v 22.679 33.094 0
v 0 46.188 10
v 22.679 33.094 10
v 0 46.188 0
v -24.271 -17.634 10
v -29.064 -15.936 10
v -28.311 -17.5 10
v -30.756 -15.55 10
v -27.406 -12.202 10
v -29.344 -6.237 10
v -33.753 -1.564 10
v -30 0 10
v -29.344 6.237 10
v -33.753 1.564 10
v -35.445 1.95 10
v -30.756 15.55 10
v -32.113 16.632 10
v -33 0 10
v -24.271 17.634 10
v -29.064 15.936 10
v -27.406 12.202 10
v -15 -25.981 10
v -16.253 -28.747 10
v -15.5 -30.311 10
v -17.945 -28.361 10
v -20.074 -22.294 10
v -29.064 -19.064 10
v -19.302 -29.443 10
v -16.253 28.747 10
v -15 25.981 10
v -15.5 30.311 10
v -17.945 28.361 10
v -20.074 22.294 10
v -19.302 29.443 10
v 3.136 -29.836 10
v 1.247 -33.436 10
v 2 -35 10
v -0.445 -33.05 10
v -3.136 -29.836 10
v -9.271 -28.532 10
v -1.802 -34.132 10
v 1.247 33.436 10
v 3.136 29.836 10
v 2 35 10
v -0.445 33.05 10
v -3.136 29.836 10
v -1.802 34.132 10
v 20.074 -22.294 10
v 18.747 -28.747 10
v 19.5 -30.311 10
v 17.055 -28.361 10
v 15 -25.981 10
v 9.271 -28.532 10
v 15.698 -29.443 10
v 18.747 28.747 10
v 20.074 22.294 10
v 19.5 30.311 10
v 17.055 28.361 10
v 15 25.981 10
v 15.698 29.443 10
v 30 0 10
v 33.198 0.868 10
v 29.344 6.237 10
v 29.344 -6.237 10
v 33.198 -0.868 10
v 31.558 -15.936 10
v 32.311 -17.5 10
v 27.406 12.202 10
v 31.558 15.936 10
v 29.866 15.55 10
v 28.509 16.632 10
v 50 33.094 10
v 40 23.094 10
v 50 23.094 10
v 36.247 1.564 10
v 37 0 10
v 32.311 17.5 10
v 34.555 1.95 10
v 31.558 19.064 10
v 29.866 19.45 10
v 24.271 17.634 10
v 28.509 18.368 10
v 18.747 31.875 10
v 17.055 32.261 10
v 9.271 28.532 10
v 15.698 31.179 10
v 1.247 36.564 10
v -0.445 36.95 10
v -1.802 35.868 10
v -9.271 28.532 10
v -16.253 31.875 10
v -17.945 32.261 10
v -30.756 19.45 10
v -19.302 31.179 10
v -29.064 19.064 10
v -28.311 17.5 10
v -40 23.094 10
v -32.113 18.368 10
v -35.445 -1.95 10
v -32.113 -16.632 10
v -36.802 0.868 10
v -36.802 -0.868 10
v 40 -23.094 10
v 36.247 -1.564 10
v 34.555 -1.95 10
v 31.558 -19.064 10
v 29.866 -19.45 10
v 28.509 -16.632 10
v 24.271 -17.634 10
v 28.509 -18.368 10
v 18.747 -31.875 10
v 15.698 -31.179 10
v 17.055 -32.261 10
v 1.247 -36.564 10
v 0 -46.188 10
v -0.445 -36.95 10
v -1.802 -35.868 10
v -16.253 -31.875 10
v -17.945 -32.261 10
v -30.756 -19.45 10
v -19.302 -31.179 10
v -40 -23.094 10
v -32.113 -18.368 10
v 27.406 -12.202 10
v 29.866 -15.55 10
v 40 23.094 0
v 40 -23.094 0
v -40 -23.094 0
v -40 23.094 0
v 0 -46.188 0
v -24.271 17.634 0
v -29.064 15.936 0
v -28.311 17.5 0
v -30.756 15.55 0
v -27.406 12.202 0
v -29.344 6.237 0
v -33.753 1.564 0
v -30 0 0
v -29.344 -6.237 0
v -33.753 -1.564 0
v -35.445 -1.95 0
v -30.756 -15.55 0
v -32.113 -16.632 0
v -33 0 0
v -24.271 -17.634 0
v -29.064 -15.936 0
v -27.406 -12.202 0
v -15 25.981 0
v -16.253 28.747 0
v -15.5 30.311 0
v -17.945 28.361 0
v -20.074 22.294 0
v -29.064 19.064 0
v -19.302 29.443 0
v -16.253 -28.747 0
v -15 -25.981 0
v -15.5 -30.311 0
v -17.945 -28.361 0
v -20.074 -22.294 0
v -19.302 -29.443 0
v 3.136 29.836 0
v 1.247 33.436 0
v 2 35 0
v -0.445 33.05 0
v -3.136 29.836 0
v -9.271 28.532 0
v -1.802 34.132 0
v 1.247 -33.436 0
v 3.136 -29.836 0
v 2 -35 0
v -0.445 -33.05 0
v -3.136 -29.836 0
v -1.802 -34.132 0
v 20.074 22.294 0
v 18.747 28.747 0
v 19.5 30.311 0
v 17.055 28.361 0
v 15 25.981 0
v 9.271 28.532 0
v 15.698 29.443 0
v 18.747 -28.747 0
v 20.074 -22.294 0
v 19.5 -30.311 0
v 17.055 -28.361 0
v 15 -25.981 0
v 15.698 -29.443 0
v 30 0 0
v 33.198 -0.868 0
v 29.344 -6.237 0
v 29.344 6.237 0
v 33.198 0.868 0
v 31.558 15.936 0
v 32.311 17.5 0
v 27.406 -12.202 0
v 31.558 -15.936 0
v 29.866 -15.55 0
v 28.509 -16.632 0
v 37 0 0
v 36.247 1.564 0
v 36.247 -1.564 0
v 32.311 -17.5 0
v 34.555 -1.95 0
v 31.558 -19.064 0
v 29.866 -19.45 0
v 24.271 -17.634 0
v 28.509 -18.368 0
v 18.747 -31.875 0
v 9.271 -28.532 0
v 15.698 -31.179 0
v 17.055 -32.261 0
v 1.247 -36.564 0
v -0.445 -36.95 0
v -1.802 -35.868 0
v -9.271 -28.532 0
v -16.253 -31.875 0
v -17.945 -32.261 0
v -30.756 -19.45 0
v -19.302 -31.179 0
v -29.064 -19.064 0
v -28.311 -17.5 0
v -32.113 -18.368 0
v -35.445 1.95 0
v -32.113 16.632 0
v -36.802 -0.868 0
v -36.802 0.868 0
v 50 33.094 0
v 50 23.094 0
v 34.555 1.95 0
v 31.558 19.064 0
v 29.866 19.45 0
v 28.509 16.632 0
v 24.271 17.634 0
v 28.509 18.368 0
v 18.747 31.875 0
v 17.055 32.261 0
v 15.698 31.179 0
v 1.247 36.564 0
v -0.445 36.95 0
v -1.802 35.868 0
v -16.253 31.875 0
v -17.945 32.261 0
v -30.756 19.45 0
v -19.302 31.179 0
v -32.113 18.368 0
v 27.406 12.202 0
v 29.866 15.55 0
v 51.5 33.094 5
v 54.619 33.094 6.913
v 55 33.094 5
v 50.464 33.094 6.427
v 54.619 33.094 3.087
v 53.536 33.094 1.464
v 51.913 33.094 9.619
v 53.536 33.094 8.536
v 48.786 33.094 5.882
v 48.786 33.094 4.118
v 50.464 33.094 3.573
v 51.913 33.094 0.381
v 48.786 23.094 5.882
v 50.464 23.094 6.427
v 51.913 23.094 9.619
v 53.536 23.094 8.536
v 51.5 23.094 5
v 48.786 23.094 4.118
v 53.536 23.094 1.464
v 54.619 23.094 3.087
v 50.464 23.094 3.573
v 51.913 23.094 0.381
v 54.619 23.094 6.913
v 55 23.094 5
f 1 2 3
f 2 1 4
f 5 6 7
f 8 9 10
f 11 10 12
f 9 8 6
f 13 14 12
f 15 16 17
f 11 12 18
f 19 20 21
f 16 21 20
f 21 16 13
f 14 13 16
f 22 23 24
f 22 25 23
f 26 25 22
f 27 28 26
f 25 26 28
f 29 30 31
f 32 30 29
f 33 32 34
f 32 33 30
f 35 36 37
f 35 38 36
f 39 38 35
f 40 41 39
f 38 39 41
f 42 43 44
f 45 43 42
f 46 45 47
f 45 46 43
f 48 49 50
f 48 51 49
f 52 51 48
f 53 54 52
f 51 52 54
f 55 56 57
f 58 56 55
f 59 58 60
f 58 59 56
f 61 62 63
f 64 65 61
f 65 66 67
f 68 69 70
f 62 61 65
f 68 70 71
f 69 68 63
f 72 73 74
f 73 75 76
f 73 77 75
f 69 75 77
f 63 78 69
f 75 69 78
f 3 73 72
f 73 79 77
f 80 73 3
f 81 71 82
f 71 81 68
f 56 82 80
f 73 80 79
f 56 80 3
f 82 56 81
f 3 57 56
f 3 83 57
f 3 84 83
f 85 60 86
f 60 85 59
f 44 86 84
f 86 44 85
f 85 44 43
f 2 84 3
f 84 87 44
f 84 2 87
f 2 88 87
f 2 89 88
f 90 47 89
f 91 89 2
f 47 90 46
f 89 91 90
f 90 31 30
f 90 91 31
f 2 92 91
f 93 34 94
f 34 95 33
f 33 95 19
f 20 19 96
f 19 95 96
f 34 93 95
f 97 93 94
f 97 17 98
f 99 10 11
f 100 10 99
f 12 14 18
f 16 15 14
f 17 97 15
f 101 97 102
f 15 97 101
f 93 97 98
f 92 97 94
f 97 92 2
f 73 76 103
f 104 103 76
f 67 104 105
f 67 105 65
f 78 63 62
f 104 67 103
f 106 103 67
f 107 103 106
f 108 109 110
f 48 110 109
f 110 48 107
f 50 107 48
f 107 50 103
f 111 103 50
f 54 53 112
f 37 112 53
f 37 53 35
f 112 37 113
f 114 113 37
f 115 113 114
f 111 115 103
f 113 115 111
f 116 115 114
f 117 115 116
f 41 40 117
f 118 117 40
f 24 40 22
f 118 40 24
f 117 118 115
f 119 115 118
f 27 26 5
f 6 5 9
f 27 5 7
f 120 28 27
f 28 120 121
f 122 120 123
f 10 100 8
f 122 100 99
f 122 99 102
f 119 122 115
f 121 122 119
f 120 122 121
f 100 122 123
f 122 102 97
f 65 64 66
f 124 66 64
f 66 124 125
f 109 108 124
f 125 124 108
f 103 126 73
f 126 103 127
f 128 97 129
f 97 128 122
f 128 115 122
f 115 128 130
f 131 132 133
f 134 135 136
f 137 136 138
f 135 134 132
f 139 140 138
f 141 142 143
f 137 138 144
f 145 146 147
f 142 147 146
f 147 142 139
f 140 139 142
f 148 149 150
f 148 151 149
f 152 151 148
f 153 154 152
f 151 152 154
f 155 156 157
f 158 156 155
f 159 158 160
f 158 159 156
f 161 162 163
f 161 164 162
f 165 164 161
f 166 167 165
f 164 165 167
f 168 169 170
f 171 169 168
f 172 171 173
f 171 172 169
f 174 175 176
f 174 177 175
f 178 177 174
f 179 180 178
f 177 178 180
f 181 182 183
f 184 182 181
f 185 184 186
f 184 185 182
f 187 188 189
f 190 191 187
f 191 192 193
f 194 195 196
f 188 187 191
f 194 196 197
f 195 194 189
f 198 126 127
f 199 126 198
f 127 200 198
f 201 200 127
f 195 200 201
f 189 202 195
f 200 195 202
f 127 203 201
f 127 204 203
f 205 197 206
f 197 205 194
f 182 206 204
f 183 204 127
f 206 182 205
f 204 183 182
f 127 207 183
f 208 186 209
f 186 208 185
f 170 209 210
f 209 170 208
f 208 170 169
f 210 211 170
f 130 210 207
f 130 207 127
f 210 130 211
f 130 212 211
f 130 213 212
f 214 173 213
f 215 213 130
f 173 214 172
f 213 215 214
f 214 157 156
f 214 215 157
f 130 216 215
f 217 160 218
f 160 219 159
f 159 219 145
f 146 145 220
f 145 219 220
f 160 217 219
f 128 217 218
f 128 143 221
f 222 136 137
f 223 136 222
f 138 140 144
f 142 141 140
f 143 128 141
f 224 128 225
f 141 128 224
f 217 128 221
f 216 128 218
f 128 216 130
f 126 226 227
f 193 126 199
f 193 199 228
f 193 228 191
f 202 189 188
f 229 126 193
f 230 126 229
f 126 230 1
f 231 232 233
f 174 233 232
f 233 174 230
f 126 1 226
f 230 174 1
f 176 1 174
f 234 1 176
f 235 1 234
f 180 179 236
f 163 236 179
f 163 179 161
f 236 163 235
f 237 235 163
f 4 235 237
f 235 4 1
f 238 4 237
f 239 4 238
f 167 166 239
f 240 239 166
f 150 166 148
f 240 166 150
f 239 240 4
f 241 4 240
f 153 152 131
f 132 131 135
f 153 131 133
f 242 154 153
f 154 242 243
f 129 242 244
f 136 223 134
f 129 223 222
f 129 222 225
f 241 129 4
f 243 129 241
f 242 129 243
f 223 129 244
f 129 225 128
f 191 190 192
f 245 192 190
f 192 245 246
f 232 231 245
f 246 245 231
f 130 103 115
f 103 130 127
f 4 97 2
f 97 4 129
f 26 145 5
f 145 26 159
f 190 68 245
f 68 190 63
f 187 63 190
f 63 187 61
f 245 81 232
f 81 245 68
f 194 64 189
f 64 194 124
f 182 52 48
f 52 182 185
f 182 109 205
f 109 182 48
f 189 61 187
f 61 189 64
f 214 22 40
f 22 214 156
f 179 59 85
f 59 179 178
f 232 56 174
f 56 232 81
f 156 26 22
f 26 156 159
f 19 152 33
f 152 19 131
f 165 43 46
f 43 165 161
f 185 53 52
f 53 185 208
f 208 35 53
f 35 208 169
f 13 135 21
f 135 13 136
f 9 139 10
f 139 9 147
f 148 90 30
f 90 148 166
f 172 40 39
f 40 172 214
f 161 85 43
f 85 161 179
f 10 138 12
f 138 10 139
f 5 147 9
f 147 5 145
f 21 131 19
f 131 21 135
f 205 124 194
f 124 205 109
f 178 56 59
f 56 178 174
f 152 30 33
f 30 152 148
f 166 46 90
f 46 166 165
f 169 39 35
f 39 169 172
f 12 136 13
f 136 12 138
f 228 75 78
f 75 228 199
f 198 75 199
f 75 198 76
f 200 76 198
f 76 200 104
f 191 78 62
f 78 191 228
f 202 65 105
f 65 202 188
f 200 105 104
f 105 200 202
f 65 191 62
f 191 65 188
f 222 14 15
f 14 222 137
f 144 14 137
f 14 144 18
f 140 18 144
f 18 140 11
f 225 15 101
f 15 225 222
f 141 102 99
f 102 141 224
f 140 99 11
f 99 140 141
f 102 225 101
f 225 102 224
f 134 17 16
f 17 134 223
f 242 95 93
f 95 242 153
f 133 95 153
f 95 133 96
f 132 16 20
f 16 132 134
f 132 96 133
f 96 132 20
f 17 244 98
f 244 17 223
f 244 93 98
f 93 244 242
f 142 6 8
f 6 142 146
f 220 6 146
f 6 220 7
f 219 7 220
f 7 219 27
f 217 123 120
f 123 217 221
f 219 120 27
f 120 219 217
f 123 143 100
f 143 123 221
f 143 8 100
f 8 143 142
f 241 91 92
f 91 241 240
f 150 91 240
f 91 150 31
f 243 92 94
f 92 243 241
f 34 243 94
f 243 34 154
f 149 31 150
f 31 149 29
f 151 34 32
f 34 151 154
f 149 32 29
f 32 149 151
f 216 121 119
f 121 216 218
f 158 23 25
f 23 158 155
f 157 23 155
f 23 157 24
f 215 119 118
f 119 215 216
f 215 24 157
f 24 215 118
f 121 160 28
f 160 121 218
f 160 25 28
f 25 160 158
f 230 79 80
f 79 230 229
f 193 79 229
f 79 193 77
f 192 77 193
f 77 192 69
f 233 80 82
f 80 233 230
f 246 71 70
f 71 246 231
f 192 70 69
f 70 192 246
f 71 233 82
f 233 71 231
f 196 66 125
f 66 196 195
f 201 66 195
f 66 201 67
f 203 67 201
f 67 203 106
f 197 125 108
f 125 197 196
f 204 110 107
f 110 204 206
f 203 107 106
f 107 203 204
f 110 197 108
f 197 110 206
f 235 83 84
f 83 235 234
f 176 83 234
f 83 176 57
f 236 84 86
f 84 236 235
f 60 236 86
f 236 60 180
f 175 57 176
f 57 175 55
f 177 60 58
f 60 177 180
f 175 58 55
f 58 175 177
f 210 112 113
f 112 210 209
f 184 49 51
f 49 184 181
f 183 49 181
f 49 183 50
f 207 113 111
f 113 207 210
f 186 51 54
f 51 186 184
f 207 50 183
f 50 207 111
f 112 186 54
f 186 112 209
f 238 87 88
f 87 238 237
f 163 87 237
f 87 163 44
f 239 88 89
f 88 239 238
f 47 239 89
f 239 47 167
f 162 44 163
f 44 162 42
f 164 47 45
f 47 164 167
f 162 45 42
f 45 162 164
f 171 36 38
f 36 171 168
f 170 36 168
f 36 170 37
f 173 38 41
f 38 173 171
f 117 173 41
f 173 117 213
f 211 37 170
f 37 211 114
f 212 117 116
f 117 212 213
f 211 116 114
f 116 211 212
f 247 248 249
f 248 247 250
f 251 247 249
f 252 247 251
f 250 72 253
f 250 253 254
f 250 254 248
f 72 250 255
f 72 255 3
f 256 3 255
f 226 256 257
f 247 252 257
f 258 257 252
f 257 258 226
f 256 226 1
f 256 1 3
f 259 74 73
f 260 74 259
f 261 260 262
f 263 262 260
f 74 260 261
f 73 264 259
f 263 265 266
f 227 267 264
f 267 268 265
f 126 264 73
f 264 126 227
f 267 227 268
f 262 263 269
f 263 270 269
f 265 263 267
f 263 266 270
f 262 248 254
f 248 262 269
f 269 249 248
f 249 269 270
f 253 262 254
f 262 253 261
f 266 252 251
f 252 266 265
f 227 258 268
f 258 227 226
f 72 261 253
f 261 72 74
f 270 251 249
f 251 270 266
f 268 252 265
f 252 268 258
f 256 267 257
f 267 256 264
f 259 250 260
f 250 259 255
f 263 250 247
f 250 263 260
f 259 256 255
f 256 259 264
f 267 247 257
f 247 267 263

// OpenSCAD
H = 10;

R = 30;

thikness = 10;

base = R + thikness;

l = base*sqrt(3)/3;
L = sqrt(l*l + base*base);


r = 2;
r_base = R + thikness/2;
r_l = r_base/2;
r_L = sqrt(r_base*r_base - r_l*r_l);

r_bolt = 1.5;

difference() {
	
	// 6-angle 
	linear_extrude(height = H) {
		polygon(points=[ [base, -l], [base, l], [0, L], [-base, l], [-base, -l], [0, -L] ]);
	
	}
	{
		// Hole in center
		cylinder(h = H, r = R);

		translate([r_base, 0, 0]) cylinder(h = H, r = r);
		translate([-r_base, 0, 0]) cylinder(h = H, r = r);

		translate([-r_L, r_l, 0]) cylinder(h = H, r = r);
		translate([-r_L, -r_l, 0]) cylinder(h = H, r = r);

		translate([-r_l, r_L, 0]) cylinder(h = H, r = r);
		translate([-r_l, -r_L, 0]) cylinder(h = H, r = r);

		translate([r_L, r_l, 0]) cylinder(h = H, r = r);
		translate([r_L, -r_l, 0]) cylinder(h = H, r = r);

		translate([r_l, r_L, 0]) cylinder(h = H, r = r);
		translate([r_l, -r_L, 0]) cylinder(h = H, r = r);

		translate([0, r_base, 0]) cylinder(h = H, r = r);
		translate([0, -r_base, 0]) cylinder(h = H, r = r);
	}
}



A=10;
L2=30;

module mount() {
	  difference() {
		union() {
			cube(size=[L2, A, H]);
			translate([L2, A, A/2]) rotate(a=90, v=[1,0,0]) cylinder(r=H/2, h=A);
		}
		translate([L2, A, A/2]) rotate(a=90, v=[1,0,0]) cylinder(r=r_bolt, h=A);
	}
};


translate([base - 2*A, l, 0]) mount();
